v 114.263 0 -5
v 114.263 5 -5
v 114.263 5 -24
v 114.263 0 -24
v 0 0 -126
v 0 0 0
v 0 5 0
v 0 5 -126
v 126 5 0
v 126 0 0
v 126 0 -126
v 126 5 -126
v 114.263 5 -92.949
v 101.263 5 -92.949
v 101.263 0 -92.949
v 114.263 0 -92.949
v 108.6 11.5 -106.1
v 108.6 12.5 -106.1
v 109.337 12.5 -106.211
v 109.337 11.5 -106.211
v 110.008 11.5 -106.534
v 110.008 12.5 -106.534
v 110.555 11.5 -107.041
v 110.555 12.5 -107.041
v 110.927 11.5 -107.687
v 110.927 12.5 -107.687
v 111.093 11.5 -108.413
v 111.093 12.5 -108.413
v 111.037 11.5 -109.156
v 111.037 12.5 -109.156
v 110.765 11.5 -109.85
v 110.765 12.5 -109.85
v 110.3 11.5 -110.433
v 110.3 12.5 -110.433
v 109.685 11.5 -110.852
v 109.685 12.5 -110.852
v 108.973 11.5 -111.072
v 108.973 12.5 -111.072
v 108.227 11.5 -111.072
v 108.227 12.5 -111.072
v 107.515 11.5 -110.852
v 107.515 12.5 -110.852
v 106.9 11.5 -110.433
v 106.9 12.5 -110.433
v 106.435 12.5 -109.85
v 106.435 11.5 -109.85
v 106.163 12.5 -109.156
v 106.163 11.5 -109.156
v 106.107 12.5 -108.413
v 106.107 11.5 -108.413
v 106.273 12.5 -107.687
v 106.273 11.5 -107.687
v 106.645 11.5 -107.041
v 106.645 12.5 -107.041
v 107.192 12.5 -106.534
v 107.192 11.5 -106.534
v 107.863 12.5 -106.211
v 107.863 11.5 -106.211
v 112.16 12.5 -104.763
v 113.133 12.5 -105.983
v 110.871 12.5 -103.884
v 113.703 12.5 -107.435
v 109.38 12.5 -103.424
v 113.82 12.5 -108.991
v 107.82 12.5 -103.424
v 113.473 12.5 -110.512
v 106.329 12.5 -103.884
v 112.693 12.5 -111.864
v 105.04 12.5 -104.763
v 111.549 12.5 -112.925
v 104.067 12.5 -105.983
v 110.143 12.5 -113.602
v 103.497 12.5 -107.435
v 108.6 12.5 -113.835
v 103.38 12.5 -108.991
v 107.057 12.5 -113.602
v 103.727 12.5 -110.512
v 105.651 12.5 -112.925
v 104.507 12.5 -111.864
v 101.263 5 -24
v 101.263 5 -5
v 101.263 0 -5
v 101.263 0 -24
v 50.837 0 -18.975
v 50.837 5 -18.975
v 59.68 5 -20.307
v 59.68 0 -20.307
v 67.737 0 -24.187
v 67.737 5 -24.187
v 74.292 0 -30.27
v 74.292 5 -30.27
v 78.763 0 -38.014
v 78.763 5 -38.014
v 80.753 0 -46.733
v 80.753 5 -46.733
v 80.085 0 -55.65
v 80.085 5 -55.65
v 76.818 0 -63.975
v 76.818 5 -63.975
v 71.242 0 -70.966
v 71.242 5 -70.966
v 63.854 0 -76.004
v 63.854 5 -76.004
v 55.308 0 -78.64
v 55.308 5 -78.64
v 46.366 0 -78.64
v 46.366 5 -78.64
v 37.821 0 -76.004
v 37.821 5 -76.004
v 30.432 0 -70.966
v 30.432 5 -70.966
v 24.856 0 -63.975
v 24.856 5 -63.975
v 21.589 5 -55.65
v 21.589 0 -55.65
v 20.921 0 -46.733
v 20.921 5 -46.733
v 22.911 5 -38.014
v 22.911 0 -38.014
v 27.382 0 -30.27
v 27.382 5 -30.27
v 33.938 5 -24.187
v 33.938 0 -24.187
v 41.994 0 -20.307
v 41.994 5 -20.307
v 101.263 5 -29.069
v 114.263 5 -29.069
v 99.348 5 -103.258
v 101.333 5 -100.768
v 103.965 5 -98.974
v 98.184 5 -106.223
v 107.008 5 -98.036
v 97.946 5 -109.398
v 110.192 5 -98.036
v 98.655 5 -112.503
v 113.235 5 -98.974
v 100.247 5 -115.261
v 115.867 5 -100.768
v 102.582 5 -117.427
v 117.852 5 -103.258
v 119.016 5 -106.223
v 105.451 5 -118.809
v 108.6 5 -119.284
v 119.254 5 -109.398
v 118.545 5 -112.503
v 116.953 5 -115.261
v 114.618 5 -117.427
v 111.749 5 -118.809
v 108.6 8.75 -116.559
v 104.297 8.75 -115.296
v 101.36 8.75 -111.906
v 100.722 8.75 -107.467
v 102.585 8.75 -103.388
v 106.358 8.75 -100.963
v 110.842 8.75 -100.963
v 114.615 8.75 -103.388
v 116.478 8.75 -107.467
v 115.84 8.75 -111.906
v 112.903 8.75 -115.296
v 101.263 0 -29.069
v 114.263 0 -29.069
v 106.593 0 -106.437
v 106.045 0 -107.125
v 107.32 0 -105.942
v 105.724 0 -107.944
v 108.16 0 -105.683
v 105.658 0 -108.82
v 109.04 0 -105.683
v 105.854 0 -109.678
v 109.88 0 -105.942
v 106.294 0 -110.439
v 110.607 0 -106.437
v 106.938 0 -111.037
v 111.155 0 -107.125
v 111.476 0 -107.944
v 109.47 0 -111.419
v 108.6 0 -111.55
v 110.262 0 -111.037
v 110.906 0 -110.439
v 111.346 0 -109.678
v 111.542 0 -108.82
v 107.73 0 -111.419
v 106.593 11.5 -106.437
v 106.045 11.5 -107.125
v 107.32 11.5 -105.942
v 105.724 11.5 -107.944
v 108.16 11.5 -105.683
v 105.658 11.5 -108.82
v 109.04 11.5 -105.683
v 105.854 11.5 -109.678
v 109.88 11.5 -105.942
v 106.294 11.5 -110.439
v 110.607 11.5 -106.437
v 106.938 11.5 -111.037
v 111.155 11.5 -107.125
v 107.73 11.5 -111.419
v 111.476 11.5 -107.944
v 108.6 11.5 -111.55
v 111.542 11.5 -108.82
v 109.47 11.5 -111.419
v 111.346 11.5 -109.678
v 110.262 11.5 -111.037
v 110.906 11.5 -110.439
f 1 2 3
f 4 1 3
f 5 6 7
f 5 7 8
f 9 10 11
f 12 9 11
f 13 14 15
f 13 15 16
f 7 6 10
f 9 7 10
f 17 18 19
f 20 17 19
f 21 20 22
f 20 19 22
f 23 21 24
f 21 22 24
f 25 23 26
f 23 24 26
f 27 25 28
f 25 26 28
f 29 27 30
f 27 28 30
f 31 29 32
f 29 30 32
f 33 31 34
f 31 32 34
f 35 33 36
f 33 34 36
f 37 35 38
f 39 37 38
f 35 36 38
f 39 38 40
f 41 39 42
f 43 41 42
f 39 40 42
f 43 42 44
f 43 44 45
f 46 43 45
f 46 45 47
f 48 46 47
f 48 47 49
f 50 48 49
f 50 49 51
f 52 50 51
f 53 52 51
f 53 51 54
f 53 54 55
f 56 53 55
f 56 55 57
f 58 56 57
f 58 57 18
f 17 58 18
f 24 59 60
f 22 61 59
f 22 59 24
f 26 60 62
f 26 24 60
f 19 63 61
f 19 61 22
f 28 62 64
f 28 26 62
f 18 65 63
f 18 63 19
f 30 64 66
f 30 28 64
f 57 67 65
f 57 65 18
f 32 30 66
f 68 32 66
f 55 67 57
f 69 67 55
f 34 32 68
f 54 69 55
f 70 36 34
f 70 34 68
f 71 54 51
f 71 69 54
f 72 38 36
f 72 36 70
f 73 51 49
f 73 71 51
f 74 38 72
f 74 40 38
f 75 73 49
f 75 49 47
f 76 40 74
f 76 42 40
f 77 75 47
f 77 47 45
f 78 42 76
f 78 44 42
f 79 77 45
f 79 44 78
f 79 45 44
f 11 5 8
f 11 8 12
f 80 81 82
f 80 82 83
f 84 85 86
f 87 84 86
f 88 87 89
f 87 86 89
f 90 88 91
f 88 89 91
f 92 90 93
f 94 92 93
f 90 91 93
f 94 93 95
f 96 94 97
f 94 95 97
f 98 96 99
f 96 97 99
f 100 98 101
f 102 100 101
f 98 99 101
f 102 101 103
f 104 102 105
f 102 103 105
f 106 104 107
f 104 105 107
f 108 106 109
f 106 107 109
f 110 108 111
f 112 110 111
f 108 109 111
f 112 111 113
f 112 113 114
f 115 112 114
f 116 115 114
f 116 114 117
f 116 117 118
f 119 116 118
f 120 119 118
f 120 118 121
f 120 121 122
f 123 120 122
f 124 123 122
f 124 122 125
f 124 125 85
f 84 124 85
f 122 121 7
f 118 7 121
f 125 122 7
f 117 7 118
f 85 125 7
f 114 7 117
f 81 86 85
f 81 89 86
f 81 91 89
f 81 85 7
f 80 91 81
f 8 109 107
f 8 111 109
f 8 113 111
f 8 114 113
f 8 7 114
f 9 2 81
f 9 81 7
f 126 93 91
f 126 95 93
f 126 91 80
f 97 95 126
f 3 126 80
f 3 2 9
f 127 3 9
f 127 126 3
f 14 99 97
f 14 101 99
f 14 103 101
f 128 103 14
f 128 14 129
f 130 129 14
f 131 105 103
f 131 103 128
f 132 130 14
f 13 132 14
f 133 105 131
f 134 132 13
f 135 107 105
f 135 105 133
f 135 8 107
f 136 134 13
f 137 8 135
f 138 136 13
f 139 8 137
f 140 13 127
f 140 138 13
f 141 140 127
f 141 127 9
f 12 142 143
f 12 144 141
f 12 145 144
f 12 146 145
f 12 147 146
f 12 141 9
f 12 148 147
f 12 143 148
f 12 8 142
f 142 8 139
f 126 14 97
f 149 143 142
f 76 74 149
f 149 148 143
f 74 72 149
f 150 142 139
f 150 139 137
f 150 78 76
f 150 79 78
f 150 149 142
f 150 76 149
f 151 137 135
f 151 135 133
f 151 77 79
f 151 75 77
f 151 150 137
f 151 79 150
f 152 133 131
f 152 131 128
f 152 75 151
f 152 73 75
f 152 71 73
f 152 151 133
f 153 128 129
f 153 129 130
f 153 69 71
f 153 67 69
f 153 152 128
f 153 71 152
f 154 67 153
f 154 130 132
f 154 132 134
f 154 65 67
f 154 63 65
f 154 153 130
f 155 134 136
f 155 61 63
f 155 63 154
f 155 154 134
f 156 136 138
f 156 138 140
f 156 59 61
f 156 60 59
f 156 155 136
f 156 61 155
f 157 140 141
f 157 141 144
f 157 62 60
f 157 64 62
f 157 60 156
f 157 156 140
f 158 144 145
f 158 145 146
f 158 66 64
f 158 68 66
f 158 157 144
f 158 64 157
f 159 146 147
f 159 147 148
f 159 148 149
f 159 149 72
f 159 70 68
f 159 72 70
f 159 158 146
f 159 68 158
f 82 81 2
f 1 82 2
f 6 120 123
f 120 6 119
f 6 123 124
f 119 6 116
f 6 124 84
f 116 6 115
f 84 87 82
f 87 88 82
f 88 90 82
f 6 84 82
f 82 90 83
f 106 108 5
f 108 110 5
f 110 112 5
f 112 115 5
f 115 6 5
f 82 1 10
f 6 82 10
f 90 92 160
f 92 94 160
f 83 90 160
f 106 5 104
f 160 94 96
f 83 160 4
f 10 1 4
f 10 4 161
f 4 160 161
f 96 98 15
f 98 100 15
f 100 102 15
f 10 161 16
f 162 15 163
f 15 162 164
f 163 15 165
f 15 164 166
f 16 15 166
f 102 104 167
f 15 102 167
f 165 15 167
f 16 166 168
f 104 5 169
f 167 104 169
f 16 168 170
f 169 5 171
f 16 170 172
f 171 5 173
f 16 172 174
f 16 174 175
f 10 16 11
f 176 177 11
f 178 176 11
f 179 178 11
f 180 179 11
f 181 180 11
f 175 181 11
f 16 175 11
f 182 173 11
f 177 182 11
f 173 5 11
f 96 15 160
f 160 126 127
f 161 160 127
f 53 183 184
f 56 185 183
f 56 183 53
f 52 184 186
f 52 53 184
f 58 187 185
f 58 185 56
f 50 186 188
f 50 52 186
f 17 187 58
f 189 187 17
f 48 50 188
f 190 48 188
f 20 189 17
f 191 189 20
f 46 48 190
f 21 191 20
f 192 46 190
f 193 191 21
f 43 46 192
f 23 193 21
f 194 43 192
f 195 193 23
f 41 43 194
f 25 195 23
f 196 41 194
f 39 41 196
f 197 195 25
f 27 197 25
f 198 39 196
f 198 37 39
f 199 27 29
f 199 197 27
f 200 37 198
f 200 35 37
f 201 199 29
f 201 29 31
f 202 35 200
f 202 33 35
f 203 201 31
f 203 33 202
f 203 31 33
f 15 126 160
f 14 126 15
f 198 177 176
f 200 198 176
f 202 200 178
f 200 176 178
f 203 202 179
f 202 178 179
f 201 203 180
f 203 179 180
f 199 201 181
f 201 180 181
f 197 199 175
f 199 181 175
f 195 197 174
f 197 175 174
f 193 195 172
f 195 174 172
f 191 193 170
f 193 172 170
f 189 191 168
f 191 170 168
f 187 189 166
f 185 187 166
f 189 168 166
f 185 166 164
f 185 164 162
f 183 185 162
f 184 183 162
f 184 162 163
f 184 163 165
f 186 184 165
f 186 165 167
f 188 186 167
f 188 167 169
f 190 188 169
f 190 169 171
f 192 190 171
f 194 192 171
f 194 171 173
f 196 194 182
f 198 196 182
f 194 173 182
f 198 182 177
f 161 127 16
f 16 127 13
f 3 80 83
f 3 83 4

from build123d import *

# Parameters (mm, degrees)
SKETCH1_W           = 126
SKETCH1_H           = 126
BOSS_EXTRUDE1_DEPTH = 5
SKETCH3_R           = 12.5
BOSS_EXTRUDE2_DEPTH = 7.5
SKETCH4_R           = 2.95
CUT_EXTRUDE1_DEPTH  = 11.5
SKETCH6_R           = 2.5
CUT_EXTRUDE2_DEPTH  = 179.628805068
CHAMFER1_SIZE       = 10
CHAMFER1_SIZE_2     = 7.26542528
SKETCH8_W           = 13
SKETCH8_H           = 63.879672954
SKETCH8_H_2         = 19
CUT_EXTRUDE3_DEPTH  = 179.348675353
SKETCH9_R           = 30
CUT_EXTRUDE4_DEPTH  = 179.348675353


with BuildPart() as part:
    # Sketch1 → Boss-Extrude1 (new body)
    with BuildSketch(Plane(origin=(0, 0, 0), x_dir=(1, 0, 0), z_dir=(0, 1, 0))):
        with Locations((63, 63)):
            Rectangle(SKETCH1_W, SKETCH1_H)
    extrude(amount=BOSS_EXTRUDE1_DEPTH)

    # Sketch3 → Boss-Extrude2 (add)
    with BuildSketch(Plane(origin=(0, 5, 0), x_dir=(1, 0, 0), z_dir=(0, 1, 0))):
        with Locations(Location((108.6, 108.6, 0), (0, 0, 90))):
            Circle(SKETCH3_R)
    extrude(amount=BOSS_EXTRUDE2_DEPTH)

    # Sketch4 → Cut-Extrude1 (cut)
    with BuildSketch(Plane.XZ):
        with Locations(Location((108.6, -108.6, 0), (0, 0, 270))):
            Circle(SKETCH4_R)
    extrude(amount=-CUT_EXTRUDE1_DEPTH, mode=Mode.SUBTRACT)

    # Sketch6 → Cut-Extrude2 (cut, through all)
    with BuildSketch(Plane(origin=(0, 12.5, 0), x_dir=(1, 0, 0), z_dir=(0, 1, 0))):
        with Locations(Location((108.6, 108.6, 0), (0, 0, 270))):
            Circle(SKETCH6_R)
    extrude(amount=-CUT_EXTRUDE2_DEPTH, mode=Mode.SUBTRACT)

    # Chamfer1
    # the kernel refuses this chamfer: 10, 7.26542528 mm, written as the material it takes off along each edge
    with BuildSketch(Plane(origin=(108.6, 12.5, -108.6), x_dir=(0, 0, -1), z_dir=(1, 0, 0))) as chamfer1_piece_1_section:
        Polygon((12.5, -CHAMFER1_SIZE), (12.5 - CHAMFER1_SIZE_2, 0), (12.5, 0), align=None)
    chamfer1_piece_1 = revolve(axis=Axis((108.6, 12.5, -108.6), (0, 1, 0)), mode=Mode.PRIVATE)
    chamfer1_piece_1 = split(chamfer1_piece_1, bisect_by=Plane(origin=(108.6, 5, -100.650989912), z_dir=(0, 1, 0)), keep=Keep.TOP, mode=Mode.PRIVATE)
    add(chamfer1_piece_1, mode=Mode.SUBTRACT)

    # Sketch8 → Cut-Extrude3 (cut, through all)
    with BuildSketch(Plane(origin=(0, 5, 0), x_dir=(1, 0, 0), z_dir=(0, 1, 0))):
        with Locations((107.763328316, 61.0093315)):
            Rectangle(SKETCH8_W, SKETCH8_H)
        with Locations((107.763328316, 14.5)):
            Rectangle(SKETCH8_W, SKETCH8_H_2)
    extrude(amount=-CUT_EXTRUDE3_DEPTH, mode=Mode.SUBTRACT)

    # Sketch9 → Cut-Extrude4 (cut, through all)
    with BuildSketch(Plane(origin=(0, 5, 0), x_dir=(1, 0, 0), z_dir=(0, 1, 0))):
        with Locations(Location((50.837155032, 48.974583989, 0), (0, 0, 270))):
            Circle(SKETCH9_R)
    extrude(amount=-CUT_EXTRUDE4_DEPTH, mode=Mode.SUBTRACT)


solid = part.part
